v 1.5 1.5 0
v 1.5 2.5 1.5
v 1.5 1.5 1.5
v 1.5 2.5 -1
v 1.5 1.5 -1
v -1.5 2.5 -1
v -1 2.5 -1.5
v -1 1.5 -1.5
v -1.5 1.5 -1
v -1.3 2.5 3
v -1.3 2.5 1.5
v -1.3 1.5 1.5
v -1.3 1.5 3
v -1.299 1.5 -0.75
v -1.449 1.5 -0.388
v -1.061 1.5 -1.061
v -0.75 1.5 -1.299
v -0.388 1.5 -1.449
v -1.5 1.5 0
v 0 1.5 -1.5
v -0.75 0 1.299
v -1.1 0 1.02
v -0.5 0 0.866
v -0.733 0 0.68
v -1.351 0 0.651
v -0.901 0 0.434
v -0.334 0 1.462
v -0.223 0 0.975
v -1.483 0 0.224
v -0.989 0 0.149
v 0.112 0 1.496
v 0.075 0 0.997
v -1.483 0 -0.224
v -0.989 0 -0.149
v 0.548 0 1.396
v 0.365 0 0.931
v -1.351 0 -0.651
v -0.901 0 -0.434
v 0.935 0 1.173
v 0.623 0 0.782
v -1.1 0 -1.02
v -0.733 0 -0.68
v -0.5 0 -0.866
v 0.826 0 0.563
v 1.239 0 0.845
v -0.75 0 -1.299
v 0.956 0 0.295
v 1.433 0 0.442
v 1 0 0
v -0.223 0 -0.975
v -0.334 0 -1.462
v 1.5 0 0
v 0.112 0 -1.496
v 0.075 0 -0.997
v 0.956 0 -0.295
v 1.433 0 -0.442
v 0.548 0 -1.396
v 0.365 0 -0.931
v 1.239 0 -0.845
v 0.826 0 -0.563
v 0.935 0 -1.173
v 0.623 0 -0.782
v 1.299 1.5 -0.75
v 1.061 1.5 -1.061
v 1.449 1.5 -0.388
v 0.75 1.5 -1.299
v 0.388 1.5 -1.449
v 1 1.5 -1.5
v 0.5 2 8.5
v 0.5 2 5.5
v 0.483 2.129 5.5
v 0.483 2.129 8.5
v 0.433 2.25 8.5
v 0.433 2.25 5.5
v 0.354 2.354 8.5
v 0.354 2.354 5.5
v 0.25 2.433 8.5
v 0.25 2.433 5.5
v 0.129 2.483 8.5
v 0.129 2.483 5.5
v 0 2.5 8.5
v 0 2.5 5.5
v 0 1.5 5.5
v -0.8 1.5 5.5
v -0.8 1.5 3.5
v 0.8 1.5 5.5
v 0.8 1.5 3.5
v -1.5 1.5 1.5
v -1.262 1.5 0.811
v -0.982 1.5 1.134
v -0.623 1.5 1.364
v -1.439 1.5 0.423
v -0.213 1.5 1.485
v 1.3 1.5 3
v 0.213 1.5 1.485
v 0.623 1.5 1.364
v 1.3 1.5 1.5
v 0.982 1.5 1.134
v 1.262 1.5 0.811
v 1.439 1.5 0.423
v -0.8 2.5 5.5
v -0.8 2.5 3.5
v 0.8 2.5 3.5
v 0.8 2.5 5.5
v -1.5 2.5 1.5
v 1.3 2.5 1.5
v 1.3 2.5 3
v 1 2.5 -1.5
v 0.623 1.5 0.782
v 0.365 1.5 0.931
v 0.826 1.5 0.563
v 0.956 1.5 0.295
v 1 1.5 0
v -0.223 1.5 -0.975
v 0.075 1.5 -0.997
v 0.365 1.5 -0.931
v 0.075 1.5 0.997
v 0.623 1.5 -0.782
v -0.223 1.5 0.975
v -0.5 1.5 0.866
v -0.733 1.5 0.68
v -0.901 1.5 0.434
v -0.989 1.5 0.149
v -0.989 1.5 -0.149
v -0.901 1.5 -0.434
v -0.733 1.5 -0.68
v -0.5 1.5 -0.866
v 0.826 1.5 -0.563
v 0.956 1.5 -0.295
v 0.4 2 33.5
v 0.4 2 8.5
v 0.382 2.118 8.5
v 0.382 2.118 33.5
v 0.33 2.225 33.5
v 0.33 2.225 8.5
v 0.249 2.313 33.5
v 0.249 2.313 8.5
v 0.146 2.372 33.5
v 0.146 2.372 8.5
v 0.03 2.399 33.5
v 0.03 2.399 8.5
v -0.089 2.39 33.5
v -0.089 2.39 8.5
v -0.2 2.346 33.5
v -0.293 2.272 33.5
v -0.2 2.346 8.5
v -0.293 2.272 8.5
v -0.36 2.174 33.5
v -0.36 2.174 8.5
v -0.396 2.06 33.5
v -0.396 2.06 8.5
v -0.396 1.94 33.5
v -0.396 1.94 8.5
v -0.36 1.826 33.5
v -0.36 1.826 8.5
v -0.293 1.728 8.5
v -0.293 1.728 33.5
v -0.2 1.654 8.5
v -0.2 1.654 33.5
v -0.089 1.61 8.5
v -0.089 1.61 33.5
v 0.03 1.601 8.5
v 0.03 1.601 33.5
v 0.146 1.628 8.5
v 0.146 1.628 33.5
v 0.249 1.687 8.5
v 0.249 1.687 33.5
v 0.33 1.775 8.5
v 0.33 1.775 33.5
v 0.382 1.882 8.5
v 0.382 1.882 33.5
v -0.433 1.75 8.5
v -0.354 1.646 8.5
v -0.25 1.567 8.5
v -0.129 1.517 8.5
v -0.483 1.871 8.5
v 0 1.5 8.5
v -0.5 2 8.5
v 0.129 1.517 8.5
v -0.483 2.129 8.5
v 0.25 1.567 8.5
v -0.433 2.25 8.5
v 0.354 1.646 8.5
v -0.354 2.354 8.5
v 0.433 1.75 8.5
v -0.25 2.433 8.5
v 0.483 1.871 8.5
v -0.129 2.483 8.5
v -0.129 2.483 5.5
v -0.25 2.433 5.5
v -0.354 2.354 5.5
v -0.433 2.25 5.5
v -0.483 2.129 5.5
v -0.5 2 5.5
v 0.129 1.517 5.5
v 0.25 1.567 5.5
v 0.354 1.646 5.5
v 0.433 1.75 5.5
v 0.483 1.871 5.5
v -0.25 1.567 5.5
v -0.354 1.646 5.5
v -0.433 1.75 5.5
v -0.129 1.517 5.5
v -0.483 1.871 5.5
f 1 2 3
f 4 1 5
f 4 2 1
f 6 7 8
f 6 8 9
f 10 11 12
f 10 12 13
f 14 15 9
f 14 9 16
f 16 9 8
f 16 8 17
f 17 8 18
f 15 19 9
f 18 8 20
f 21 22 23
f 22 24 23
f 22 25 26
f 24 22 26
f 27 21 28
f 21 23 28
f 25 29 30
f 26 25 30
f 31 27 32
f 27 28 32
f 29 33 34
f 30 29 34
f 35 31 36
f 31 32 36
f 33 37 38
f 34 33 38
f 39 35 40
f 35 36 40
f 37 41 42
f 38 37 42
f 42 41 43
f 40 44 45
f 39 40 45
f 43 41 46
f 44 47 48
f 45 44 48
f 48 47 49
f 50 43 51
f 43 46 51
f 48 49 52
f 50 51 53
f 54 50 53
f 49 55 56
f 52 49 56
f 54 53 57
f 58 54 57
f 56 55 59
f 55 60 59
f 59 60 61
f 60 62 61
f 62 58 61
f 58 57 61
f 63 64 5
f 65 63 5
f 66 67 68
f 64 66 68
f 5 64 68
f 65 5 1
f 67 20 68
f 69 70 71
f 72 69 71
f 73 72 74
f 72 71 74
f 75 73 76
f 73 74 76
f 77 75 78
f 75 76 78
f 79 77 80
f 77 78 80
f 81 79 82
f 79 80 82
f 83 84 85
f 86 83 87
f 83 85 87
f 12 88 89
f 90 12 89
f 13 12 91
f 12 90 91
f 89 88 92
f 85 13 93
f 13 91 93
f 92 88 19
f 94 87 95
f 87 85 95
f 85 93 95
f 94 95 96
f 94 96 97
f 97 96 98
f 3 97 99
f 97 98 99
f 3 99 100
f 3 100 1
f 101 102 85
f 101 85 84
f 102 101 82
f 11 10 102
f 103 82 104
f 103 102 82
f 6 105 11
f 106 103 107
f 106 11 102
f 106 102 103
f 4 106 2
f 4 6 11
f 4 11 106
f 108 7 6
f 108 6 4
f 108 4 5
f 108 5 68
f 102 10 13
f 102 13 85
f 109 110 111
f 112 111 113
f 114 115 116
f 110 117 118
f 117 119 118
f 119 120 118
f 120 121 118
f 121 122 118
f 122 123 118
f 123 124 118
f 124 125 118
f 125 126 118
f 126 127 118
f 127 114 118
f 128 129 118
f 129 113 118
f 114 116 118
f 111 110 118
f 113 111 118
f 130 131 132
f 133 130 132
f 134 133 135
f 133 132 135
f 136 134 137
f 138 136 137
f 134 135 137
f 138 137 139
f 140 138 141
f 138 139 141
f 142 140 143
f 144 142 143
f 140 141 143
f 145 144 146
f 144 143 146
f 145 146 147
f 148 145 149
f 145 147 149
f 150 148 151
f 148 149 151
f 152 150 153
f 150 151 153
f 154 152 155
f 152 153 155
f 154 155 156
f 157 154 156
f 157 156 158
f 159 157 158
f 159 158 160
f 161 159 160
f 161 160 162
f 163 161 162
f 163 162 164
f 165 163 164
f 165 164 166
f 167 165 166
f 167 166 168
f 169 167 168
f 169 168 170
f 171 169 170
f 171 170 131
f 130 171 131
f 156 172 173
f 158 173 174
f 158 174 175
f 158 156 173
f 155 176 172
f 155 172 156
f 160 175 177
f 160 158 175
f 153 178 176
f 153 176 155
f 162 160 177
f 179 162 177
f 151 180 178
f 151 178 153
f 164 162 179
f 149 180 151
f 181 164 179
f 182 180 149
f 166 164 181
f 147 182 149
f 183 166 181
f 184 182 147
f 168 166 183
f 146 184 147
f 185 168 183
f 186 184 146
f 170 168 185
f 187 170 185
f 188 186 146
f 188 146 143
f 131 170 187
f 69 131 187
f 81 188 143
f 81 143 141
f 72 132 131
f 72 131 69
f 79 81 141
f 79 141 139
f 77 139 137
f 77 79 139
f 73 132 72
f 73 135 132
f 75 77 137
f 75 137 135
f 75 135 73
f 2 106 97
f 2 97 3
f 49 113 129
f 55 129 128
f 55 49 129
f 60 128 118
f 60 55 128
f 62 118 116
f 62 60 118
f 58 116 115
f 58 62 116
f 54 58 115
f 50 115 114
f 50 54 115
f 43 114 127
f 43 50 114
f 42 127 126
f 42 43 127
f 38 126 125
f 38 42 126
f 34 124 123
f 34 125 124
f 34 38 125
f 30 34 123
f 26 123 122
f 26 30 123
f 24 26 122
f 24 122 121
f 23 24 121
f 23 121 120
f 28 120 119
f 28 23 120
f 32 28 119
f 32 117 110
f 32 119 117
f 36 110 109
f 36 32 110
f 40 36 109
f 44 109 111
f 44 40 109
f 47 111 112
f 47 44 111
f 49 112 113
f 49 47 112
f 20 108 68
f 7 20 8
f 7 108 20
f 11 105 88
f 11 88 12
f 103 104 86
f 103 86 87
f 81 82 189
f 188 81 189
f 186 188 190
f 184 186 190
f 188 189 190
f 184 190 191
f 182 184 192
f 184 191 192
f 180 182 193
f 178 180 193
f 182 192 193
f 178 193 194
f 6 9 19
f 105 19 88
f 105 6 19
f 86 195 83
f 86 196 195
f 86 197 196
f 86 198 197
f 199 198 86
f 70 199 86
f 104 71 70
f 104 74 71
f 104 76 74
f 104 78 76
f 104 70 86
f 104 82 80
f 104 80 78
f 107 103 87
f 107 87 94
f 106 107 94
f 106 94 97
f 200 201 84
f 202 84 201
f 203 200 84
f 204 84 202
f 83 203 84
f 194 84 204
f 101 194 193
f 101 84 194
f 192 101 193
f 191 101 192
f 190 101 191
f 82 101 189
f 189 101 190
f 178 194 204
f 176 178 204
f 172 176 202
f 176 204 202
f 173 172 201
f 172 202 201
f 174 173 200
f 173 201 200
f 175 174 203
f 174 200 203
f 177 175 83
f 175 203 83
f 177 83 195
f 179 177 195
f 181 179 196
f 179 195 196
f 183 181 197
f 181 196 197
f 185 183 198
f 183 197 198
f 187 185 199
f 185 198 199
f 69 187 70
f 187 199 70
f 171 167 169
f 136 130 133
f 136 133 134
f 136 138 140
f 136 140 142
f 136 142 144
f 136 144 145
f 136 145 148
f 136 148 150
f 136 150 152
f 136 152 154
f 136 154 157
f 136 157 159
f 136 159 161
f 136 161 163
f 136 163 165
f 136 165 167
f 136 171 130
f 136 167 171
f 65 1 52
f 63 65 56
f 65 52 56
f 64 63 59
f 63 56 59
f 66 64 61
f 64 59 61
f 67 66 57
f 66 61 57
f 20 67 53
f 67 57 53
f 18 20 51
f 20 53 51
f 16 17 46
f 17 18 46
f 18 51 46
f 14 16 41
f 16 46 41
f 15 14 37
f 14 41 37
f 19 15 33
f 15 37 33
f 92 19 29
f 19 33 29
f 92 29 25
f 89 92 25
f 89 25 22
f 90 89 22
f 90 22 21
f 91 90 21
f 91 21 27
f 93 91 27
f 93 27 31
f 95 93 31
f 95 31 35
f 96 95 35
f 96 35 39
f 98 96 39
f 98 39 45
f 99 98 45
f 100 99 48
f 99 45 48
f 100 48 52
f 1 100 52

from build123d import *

# Parameters (mm, degrees)
SKETCH1_R           = 1.5
SKETCH1_R_2         = 1
BOSS_EXTRUDE1_DEPTH = 2.5
BOSS_EXTRUDE2_START = -1
SKETCH2_R           = 1
BOSS_EXTRUDE2_DEPTH = 1
SKETCH3_R           = 0.5
SKETCH3_R_2         = 0.4
BOSS_EXTRUDE3_DEPTH = 3
SKETCH3_3_R         = 0.4
BOSS_EXTRUDE4_DEPTH = 28
BOSS_EXTRUDE5_DEPTH = 1


with BuildPart() as part:
    # Sketch1 → Boss-Extrude1 (new body)
    with BuildSketch(Plane(origin=(0, 0, 0), x_dir=(1, 0, 0), z_dir=(0, 1, 0))):
        Circle(SKETCH1_R)
        Circle(SKETCH1_R_2, mode=Mode.SUBTRACT)
    extrude(amount=BOSS_EXTRUDE1_DEPTH)

    # Sketch2 → Boss-Extrude2 (add)
    with BuildSketch(Plane(origin=(0, 2.5, 0), x_dir=(1, 0, 0), z_dir=(0, 1, 0)).offset(BOSS_EXTRUDE2_START)):
        Polygon((1.3, -3), (1.3, -1.5), (1.5, -1.5), (1.5, 1), (1, 1.5), (-1, 1.5), (-1.5, 1), (-1.5, -1.5), (-1.3, -1.5), (-1.3, -3), (-0.8, -3.5), (-0.8, -5.5), (0.8, -5.5), (0.8, -3.5), align=None)
        Circle(SKETCH2_R, mode=Mode.SUBTRACT)
    extrude(amount=BOSS_EXTRUDE2_DEPTH)

    # Sketch3 → Boss-Extrude3 (add)
    with BuildSketch(Plane.XY.offset(5.5)):
        with Locations((0, 2)):
            Circle(SKETCH3_R)
        with Locations((0, 2)):
            Circle(SKETCH3_R_2, mode=Mode.SUBTRACT)
    extrude(amount=BOSS_EXTRUDE3_DEPTH)

    # Sketch3_3 → Boss-Extrude4 (add)
    with BuildSketch(Plane.XY.offset(5.5)):
        with Locations((0, 2)):
            Circle(SKETCH3_3_R)
    extrude(amount=BOSS_EXTRUDE4_DEPTH)

    # Sketch4 → Boss-Extrude5 (add)
    with BuildSketch(Plane(origin=(0, 2.5, 0), x_dir=(1, 0, 0), z_dir=(0, 1, 0))):
        Polygon((1.3, -1.5), (1.5, -1.5), (1.5, 1), (1, 1.5), (-1, 1.5), (-1.5, 1), (-1.5, -1.5), (-1.3, -1.5), (-1.3, -3), (-0.8, -3.5), (-0.8, -5.5), (0, -5.5), (0.8, -5.5), (0.8, -3.5), (1.3, -3), align=None)
    extrude(amount=-BOSS_EXTRUDE5_DEPTH)


solid = part.part
